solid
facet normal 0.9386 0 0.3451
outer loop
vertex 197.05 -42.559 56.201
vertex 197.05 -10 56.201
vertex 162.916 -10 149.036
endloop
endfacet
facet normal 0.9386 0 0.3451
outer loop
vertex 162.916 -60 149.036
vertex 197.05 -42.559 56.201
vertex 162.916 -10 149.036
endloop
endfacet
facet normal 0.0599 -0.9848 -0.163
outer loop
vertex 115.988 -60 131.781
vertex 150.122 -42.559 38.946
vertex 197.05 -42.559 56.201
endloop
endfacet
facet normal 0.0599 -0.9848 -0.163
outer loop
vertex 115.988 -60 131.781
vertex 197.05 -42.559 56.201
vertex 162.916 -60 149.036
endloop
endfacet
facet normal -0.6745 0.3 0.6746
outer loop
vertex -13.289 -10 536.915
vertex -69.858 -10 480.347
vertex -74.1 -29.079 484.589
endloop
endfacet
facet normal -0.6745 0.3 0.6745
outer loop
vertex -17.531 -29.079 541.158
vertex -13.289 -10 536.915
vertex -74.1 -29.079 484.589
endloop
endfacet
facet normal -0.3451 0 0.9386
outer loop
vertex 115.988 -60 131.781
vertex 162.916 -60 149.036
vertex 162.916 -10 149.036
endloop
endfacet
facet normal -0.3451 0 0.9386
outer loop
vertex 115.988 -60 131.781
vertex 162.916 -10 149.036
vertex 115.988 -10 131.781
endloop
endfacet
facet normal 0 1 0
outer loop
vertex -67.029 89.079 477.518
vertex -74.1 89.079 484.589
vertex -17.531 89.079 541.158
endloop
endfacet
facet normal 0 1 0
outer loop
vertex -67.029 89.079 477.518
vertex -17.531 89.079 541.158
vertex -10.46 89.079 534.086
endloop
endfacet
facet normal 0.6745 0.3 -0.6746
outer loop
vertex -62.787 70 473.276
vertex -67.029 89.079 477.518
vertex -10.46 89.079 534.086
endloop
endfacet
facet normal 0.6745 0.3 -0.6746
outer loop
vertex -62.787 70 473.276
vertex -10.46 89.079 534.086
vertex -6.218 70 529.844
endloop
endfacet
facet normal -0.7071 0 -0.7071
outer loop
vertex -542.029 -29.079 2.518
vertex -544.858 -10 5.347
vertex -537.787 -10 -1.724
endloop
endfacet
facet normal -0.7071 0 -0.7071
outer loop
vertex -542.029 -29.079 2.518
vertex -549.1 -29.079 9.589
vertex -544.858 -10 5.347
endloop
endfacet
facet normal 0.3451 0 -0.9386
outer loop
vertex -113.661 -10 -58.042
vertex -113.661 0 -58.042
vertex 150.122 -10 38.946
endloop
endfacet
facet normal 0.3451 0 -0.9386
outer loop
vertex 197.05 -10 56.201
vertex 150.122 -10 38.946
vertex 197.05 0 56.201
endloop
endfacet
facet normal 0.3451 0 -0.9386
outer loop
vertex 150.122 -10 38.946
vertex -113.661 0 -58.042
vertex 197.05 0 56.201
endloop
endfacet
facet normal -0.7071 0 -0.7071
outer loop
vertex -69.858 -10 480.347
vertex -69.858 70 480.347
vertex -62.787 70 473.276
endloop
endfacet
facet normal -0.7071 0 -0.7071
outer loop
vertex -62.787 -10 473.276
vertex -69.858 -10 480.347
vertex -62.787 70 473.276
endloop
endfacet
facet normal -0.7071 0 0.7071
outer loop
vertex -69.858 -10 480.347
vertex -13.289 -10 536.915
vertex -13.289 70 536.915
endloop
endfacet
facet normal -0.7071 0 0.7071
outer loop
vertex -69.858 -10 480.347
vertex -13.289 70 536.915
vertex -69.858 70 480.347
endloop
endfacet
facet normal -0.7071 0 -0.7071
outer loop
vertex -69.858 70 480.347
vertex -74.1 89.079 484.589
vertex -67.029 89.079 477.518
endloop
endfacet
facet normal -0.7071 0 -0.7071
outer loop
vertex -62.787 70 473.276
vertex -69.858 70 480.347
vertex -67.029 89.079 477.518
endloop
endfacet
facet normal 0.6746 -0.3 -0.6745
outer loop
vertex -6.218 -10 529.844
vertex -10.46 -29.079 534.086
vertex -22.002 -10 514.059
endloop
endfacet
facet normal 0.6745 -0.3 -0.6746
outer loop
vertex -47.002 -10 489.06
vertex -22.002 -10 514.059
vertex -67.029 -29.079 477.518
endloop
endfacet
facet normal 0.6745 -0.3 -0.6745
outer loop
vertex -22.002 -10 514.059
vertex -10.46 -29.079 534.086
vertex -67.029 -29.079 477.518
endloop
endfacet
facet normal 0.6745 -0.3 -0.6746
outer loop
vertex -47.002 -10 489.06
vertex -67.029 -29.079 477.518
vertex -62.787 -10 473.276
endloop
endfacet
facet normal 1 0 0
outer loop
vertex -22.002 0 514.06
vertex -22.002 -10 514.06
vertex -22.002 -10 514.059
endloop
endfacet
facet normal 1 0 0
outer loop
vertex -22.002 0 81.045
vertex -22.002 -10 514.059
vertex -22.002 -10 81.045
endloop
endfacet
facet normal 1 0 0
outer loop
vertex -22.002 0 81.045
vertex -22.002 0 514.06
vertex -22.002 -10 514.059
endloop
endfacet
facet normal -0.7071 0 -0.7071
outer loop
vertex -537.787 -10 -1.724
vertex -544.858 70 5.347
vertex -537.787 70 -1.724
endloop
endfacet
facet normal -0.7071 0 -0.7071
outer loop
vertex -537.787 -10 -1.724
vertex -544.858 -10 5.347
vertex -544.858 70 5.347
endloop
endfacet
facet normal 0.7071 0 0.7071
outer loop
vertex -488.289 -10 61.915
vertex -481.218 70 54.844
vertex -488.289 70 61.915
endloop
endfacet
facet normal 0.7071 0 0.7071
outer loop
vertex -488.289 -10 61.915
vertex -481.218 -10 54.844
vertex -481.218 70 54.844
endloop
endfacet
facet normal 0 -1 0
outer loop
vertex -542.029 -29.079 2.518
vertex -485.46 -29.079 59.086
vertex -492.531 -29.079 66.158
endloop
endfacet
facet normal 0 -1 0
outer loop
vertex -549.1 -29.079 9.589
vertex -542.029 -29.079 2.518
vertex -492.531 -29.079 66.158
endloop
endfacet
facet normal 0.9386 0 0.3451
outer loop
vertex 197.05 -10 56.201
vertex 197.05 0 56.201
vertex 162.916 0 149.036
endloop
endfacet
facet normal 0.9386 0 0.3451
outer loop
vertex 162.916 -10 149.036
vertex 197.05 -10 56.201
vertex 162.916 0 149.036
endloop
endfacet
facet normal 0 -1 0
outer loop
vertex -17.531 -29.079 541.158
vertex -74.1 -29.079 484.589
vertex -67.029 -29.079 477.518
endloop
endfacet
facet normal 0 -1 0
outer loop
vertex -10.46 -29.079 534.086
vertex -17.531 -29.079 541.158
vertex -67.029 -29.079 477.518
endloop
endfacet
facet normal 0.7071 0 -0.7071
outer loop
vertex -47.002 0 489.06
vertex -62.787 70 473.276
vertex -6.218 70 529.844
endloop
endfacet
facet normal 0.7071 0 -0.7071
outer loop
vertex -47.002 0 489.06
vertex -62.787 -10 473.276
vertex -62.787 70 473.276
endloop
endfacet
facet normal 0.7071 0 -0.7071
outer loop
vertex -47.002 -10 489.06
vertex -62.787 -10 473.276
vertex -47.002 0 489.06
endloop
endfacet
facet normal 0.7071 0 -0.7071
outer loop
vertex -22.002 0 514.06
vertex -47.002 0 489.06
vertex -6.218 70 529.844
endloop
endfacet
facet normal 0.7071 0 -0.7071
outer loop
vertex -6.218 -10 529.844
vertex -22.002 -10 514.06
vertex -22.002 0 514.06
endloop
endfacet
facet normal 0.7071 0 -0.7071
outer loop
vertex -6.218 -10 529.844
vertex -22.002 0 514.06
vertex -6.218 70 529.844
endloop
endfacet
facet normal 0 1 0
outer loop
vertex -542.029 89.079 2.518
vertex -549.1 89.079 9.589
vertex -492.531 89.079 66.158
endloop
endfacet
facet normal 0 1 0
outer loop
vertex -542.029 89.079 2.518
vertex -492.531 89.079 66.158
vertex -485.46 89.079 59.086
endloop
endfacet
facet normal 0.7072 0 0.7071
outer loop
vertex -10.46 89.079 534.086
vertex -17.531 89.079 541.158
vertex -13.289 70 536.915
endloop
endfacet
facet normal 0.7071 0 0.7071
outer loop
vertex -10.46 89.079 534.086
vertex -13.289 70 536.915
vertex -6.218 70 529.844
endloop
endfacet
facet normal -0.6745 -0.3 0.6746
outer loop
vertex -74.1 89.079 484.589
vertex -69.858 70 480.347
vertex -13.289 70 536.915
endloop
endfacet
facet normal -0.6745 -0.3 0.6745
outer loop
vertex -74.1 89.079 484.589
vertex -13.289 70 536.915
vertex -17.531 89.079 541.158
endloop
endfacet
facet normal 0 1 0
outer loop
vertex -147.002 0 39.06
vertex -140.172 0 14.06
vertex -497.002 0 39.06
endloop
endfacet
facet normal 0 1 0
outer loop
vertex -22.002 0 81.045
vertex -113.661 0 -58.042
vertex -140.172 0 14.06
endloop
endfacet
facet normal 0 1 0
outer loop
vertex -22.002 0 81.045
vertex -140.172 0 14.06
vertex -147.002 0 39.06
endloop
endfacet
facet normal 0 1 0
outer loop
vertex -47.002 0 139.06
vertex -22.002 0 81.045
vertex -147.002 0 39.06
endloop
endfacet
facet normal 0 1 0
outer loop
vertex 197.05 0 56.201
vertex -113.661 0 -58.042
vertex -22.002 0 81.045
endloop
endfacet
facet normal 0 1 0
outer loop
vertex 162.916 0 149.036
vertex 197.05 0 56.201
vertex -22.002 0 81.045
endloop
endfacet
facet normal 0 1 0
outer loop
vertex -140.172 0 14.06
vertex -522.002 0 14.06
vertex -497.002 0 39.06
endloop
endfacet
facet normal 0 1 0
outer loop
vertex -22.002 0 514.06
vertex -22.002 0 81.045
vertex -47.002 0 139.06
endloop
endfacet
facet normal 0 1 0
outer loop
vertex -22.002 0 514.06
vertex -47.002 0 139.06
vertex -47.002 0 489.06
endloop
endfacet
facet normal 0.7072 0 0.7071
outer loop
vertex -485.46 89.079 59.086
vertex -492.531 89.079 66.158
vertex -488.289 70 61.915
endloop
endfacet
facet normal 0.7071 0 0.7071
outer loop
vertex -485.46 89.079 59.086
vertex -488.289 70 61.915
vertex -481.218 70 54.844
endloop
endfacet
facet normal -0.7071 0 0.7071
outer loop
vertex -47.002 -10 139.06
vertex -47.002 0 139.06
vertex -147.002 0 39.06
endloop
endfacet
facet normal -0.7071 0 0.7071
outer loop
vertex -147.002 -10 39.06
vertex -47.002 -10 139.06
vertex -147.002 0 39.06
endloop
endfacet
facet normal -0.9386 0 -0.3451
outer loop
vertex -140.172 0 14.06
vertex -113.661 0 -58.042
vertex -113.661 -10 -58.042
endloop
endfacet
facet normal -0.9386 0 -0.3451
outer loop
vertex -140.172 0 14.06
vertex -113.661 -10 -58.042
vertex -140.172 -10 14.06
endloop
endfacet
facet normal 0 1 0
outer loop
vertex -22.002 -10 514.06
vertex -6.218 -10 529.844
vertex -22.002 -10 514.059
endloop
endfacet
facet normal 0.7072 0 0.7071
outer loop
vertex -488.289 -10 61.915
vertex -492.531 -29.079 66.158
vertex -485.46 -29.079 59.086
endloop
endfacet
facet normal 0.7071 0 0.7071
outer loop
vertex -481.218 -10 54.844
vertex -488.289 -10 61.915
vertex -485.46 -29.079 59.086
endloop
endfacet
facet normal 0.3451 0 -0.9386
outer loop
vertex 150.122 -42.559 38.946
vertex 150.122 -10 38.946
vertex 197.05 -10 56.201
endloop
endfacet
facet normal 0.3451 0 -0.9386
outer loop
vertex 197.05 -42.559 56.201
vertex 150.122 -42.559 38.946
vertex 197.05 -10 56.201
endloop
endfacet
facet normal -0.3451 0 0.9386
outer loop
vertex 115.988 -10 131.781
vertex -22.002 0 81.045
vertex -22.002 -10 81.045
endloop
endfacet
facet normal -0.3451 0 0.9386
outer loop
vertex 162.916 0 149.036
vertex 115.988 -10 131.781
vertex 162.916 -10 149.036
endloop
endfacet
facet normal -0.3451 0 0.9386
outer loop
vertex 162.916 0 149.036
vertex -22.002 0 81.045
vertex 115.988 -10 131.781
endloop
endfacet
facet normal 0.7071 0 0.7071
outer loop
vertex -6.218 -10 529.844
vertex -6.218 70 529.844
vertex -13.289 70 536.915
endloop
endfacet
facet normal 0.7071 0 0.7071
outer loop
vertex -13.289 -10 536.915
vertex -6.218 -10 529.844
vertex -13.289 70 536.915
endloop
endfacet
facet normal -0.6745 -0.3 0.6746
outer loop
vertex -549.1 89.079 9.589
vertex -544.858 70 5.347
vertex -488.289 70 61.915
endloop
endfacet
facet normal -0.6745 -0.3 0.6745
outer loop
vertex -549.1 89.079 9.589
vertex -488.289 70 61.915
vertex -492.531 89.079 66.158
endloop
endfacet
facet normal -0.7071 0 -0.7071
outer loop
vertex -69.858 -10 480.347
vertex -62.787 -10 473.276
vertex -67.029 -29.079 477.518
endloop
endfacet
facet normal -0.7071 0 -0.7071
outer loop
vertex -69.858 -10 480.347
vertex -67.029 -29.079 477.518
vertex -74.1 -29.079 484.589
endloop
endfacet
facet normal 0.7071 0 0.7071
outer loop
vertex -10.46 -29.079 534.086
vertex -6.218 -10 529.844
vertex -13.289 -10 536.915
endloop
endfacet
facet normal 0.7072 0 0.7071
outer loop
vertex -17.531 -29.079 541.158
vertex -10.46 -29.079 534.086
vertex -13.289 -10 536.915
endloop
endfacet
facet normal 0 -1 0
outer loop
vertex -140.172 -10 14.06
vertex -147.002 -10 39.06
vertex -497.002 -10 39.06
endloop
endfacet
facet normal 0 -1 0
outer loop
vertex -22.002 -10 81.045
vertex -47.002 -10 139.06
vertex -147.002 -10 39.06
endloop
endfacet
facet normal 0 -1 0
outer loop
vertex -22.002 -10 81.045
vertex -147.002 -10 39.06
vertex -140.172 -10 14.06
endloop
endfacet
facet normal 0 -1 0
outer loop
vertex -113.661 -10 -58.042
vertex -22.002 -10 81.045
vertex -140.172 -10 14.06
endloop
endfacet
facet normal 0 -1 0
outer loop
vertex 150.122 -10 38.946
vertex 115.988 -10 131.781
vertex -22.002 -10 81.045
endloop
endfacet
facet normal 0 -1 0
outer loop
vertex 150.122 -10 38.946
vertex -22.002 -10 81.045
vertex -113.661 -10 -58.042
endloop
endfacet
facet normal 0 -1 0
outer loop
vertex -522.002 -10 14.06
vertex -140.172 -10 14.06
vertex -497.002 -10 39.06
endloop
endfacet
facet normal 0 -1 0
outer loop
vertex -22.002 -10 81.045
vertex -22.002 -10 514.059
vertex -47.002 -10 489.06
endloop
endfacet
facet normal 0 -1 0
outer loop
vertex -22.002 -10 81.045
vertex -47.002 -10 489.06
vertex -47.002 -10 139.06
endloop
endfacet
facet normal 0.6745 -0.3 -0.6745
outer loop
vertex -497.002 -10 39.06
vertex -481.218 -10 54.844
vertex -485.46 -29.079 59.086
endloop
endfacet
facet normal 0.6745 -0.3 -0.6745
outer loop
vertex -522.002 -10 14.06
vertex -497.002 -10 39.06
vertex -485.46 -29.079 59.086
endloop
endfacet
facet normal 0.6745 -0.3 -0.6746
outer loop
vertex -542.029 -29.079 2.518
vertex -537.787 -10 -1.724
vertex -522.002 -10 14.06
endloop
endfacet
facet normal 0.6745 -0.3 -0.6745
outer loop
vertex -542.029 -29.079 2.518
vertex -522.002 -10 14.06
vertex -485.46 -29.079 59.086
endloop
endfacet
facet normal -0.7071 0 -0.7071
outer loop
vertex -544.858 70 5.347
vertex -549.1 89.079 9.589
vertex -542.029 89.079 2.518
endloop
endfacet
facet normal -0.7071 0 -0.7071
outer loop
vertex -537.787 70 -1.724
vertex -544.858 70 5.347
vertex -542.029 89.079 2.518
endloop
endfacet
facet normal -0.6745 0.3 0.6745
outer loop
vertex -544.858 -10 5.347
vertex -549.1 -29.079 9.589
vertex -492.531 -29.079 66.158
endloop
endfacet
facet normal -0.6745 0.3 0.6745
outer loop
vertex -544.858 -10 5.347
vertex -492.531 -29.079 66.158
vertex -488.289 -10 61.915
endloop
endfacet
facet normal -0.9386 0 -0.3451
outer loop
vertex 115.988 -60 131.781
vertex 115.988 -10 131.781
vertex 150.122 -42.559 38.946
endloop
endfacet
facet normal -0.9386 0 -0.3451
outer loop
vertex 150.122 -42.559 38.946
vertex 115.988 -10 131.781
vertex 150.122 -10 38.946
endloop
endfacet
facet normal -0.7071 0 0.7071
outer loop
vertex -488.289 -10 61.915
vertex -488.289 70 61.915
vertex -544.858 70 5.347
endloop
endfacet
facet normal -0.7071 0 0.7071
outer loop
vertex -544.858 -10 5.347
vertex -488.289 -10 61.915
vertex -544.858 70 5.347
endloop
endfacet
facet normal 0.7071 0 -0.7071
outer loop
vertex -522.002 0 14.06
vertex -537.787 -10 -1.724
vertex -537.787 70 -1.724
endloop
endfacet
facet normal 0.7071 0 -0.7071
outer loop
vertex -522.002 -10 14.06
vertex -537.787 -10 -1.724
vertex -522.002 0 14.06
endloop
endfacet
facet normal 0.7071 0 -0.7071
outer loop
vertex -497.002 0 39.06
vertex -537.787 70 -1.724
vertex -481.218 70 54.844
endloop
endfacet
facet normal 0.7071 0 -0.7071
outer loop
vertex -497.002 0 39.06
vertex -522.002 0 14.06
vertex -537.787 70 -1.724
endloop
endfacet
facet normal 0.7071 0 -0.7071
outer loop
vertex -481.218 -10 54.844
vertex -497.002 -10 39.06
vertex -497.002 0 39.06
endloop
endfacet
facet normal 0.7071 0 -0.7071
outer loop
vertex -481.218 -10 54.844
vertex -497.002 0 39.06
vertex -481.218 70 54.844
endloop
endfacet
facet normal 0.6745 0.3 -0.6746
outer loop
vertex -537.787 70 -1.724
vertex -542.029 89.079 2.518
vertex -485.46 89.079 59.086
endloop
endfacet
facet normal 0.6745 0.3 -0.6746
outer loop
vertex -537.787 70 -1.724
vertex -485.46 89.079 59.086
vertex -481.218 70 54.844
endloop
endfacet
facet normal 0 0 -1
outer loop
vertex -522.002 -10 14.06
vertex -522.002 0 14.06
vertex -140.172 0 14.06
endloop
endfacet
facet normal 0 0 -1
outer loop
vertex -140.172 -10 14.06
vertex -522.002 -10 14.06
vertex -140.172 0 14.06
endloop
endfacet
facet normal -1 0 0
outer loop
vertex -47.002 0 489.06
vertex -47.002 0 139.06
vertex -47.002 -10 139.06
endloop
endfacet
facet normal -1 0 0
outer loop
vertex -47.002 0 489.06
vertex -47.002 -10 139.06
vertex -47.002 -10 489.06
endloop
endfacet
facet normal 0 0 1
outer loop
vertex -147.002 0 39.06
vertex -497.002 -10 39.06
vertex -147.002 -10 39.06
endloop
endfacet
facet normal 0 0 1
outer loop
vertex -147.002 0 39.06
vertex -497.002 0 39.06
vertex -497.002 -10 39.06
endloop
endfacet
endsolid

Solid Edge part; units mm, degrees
sketch "Sketch1" plane through (0, 0, 0) normal (0, -1, 0) x (1, 0, 0)
  line L0 (-47.0022, 489.0599) -> (-22.0022, 514.0599)
  line L1 (-22.0022, 514.0599) -> (-22.0022, 81.0447)
  line L2 (-22.0022, 81.0447) -> (162.9162, 149.0358)
  line L3 (197.0498, 56.2011) -> (162.9162, 149.0358)
  line L4 (-113.6611, -58.0415) -> (197.0498, 56.2011)
  line L5 (-113.6611, -58.0415) -> (-140.1715, 14.0599)
  line L6 (-522.0022, 14.0599) -> (-140.1715, 14.0599)
  line L7 (-497.0022, 39.0599) -> (-522.0022, 14.0599)
  line L8 (-497.0022, 39.0599) -> (-147.0022, 39.0599)
  line L9 (-47.0022, 139.0599) -> (-147.0022, 39.0599)
  line L10 (-47.0022, 139.0599) -> (-47.0022, 489.0599)
  dimension "D1" = 350
extrude "Protrusion1" add sketch "Sketch1" along normal blind 10
sketch "Sketch2" plane through (-272.0022, -10, 264.0599) normal (0, -1, 0) x (0, 0, 1)
  line L0 (-265.7843, 265.7843) -> (-209.2157, 209.2157)
  line L1 (-209.2157, 209.2157) -> (-202.1447, 216.2868)
  line L2 (-202.1447, 216.2868) -> (-258.7132, 272.8553)
  line L3 (-258.7132, 272.8553) -> (-265.7843, 265.7843)
  line L4 (209.2157, -209.2157) -> (265.7843, -265.7843)
  line L5 (265.7843, -265.7843) -> (272.8553, -258.7132)
  line L6 (272.8553, -258.7132) -> (216.2868, -202.1447)
  line L7 (216.2868, -202.1447) -> (209.2157, -209.2157)
  dimension "D1" = 10
  dimension "D2" = 80
  dimension "D3" = 10
  dimension "D4" = 80
extrude "ExtrudedProtrusion_2" add sketch "Sketch2" against normal blind 80
sketch "Sketch3" plane through (-173.9038, -10, 239.4369) normal (0, -1, 0) x (1, 0, 0)
  line L0 (289.8917, -107.6558) -> (324.0253, -200.4904)
  line L1 (324.0253, -200.4904) -> (370.9537, -183.2357)
  line L2 (370.9537, -183.2357) -> (336.8201, -90.401)
  line L3 (336.8201, -90.401) -> (289.8917, -107.6558)
  dimension "D1" = 50
  dimension "D2" = 98.911
extrude "ExtrudedProtrusion_3" add sketch "Sketch3" along normal blind 50
sketch "Sketch4" plane through (-66.322, 10, 476.8112) normal (-0.7071068, 0, -0.7071068) x (0, -1, 0)
  line L0 (20, 5) -> (39.0788, 11)
  line L1 (39.0788, 11) -> (39.0788, 1)
  line L2 (39.0788, 1) -> (20, -5)
  line L3 (20, -5) -> (20, 5)
  line L4 (-60, 5) -> (-79.0788, 11)
  line L5 (-79.0788, 11) -> (-79.0788, 1)
  line L6 (-79.0788, 1) -> (-60, -5)
  line L7 (-60, 5) -> (-60, -5)
  dimension "D1" = 10
  dimension "D2" = 20
  dimension "D3" = 6
extrude "ExtrudedProtrusion_4" add sketch "Sketch4" against normal blind 80
sketch "Sketch5" plane through (-541.322, 30, 1.8112) normal (-0.7071068, 0, -0.7071068) x (0, -1, 0)
  line L0 (-40, 5) -> (-59.0788, 11)
  line L1 (-59.0788, 11) -> (-59.0788, 1)
  line L2 (-59.0788, 1) -> (-40, -5)
  line L3 (-40, -5) -> (-40, 5)
  line L4 (40, 5) -> (40, -5)
  line L5 (40, -5) -> (59.0788, 1)
  line L6 (59.0788, 1) -> (59.0788, 11)
  line L7 (59.0788, 11) -> (40, 5)
extrude "ExtrudedProtrusion_5" add sketch "Sketch5" against normal blind 80
sketch "Sketch6" plane through (133.0546, -35, 85.3638) normal (-0.9385681, 0, -0.3450941) x (0, -1, 0)
  line L0 (25, 49.4555) -> (25, -49.4555)
  line L1 (25, -49.4555) -> (7.5593, -49.4555)
  line L2 (7.5593, -49.4555) -> (25, 49.4555)
extrude "Cutout1" cut sketch "Sketch6" against normal through all
